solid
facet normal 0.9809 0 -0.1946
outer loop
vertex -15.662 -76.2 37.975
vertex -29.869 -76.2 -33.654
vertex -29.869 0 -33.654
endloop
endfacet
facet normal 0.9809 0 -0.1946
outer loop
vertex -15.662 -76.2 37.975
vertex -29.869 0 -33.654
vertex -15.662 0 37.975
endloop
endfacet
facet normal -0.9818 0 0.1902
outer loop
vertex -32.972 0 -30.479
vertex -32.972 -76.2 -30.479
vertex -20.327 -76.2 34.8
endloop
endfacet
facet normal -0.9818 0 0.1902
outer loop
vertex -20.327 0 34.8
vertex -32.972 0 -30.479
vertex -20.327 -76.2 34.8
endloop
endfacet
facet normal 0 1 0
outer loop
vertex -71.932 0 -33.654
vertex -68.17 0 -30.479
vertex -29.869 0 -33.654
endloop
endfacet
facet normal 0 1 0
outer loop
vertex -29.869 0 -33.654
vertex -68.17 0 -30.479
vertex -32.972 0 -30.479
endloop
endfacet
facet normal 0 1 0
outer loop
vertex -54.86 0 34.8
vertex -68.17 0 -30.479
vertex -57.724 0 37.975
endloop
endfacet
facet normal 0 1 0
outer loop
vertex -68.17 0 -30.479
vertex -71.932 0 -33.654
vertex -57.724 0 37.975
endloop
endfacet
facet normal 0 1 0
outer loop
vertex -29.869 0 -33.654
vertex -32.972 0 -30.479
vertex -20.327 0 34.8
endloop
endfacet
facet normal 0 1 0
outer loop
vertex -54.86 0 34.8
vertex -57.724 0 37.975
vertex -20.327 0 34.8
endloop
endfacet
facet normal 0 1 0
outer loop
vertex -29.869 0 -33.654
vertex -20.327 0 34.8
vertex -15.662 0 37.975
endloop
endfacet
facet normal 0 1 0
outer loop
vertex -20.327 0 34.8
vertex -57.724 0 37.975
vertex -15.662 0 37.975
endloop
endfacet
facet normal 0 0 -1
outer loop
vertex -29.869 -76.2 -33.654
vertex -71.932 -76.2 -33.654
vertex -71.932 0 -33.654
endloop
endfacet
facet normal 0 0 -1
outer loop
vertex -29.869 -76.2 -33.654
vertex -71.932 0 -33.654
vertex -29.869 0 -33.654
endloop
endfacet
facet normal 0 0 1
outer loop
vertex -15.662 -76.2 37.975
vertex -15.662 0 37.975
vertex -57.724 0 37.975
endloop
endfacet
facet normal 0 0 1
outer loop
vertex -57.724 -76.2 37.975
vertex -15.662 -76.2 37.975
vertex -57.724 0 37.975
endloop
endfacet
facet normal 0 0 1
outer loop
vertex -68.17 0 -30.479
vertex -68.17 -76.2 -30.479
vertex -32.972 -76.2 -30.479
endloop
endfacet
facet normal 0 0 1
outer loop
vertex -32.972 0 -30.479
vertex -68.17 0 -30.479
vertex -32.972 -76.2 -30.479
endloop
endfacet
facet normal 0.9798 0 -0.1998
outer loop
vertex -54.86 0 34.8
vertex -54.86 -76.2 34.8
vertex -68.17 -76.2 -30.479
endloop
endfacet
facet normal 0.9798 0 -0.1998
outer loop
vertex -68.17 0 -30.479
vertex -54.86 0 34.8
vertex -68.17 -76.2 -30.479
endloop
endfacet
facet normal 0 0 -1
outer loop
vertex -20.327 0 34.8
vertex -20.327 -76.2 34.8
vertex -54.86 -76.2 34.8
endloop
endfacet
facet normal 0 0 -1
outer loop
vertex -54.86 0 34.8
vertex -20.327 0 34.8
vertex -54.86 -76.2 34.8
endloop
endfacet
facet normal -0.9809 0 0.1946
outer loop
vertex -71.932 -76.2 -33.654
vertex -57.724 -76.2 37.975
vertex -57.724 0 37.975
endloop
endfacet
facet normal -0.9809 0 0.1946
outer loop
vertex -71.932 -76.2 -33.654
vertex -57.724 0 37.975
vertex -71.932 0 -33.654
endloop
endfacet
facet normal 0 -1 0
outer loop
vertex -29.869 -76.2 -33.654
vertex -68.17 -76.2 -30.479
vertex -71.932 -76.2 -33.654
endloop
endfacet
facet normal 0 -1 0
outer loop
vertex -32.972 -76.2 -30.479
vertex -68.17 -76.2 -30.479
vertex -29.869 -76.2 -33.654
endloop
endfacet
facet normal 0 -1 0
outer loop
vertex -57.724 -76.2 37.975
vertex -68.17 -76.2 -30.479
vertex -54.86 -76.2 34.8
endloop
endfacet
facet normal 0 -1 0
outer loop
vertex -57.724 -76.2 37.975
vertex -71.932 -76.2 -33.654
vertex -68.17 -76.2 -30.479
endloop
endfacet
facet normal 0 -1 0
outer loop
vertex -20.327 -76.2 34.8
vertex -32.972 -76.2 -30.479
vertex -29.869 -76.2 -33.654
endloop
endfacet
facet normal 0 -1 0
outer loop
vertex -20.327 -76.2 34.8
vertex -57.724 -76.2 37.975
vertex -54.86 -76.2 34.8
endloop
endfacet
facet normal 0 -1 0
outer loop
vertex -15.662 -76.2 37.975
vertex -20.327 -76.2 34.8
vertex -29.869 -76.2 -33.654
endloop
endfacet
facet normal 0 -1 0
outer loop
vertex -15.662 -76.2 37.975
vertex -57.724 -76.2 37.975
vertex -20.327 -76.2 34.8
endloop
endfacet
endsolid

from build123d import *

# Parameters (mm, degrees)
F1_DEPTH = 76.2
F3_DEPTH = 101.6


with BuildPart() as f1:
    # F0 (on Front) → F1 (new body)
    with BuildSketch(Plane.XZ):
        Polygon((-15.662028, 37.975211), (-57.724428, 37.975211), (-71.931587, -33.654443), (-29.869187, -33.654443), align=None)
    extrude(amount=F1_DEPTH)

    # F2 (on Front) → F3 (cut, symmetric)
    with BuildSketch(Plane.XZ):
        Polygon((-32.971758, -30.479443), (-20.326851, 34.800211), (-54.859936, 34.800211), (-68.170242, -30.479443), align=None)
    extrude(amount=F3_DEPTH, both=True, mode=Mode.SUBTRACT)


solid = f1.part
